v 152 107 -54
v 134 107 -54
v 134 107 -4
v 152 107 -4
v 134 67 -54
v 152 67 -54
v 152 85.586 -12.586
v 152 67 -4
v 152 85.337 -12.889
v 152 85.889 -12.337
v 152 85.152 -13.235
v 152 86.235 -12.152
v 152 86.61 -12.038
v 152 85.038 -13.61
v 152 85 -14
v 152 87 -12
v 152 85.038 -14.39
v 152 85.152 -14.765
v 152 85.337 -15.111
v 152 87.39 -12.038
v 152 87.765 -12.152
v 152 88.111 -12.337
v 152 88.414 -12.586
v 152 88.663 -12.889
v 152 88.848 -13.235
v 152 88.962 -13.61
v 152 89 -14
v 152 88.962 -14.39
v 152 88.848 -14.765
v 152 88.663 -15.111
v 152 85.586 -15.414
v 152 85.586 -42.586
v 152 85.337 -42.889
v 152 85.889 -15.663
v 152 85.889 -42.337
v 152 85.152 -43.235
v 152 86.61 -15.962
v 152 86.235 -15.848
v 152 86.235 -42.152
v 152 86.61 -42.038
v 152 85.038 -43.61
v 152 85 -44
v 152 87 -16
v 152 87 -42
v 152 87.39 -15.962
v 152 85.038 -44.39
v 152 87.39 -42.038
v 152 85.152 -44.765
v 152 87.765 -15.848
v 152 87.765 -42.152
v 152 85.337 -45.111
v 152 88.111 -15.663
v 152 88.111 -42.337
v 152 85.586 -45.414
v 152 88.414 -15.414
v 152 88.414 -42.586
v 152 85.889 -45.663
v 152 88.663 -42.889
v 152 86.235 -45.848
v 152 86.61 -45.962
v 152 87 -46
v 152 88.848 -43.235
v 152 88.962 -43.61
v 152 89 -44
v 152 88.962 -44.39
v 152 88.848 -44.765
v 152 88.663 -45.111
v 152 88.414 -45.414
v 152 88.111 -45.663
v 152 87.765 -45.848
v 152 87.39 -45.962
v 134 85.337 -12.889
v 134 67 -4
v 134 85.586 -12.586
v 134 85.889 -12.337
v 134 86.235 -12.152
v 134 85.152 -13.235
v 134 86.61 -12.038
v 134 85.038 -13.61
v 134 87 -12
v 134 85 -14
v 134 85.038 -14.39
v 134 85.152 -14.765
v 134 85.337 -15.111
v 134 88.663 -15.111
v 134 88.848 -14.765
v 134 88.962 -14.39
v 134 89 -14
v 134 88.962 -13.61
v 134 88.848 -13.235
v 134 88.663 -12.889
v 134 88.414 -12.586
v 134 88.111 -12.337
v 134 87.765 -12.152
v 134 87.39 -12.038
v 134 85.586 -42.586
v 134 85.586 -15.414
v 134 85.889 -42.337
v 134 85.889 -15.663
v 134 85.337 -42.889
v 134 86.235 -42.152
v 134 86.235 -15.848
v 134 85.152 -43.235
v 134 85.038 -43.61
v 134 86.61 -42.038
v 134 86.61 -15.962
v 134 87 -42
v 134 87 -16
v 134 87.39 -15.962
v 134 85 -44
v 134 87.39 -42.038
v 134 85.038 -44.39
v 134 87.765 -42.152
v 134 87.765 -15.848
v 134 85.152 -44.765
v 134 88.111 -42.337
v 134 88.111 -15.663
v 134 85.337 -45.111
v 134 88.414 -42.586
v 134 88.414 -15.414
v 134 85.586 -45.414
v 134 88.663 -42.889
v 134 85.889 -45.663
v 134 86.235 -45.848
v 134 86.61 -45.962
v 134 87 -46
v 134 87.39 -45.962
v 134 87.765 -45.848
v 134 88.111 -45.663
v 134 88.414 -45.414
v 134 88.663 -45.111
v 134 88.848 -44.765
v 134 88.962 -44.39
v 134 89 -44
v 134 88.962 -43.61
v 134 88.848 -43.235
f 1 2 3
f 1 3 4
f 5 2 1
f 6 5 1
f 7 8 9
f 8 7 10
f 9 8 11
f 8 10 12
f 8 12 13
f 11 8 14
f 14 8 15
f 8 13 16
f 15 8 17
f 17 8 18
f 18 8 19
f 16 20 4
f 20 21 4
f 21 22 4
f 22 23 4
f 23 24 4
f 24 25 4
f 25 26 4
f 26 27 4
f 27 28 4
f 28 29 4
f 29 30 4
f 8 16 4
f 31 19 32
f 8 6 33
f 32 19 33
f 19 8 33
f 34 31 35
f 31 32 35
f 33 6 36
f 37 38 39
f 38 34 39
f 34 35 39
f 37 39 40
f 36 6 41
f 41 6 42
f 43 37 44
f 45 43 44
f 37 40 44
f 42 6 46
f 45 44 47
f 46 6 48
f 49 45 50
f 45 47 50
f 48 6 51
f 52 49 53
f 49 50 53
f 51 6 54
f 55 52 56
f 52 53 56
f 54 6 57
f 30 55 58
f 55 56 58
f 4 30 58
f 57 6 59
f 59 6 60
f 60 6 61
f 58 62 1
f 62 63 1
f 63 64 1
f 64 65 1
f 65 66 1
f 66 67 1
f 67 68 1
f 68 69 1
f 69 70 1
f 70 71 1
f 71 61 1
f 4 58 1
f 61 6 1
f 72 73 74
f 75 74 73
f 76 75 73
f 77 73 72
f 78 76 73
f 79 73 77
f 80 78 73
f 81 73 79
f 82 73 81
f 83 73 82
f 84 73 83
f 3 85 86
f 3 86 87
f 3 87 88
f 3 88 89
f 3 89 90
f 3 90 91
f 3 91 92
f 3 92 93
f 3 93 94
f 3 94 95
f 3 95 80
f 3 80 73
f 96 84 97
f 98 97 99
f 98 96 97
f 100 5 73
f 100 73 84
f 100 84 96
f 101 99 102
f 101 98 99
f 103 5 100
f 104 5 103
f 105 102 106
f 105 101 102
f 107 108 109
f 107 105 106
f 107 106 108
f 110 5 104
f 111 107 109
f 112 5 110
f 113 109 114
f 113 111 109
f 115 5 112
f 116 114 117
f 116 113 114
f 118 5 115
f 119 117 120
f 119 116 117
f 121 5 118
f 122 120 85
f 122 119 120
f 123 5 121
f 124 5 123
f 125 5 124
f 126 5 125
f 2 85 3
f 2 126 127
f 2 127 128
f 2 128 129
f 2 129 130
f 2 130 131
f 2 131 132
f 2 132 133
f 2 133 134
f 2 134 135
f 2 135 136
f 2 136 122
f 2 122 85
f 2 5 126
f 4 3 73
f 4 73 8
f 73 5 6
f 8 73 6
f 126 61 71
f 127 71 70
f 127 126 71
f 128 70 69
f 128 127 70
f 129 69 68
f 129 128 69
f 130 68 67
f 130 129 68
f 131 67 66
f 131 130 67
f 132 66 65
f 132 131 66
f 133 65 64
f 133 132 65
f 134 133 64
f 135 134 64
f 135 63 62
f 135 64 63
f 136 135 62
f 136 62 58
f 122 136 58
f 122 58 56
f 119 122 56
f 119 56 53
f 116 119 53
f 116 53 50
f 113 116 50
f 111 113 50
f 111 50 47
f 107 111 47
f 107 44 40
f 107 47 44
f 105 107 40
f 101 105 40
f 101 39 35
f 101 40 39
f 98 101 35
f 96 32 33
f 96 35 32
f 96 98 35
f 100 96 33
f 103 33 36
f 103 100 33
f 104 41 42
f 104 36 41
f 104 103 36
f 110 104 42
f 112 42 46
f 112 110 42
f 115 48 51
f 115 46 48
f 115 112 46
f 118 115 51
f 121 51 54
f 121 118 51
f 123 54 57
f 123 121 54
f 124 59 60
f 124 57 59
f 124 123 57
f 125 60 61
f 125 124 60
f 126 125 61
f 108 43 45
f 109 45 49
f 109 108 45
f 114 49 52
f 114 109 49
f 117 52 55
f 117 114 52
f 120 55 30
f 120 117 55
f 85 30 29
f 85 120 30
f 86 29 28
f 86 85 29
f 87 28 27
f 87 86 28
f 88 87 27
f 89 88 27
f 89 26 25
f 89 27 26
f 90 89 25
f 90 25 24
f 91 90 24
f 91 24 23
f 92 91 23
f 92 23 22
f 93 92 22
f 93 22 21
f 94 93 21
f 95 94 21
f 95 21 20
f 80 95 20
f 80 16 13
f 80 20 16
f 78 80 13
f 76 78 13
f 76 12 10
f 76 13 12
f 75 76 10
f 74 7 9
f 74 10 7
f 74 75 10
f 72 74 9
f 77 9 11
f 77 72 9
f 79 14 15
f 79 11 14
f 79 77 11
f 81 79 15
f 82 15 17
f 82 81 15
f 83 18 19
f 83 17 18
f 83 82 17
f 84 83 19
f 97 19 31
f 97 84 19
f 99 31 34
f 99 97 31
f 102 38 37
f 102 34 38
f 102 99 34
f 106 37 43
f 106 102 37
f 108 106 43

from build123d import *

# Parameters (mm, degrees)
CYLINDER028_R           = 2
CYLINDER028_DEPTH       = 20
CYLINDER028_PITCH_ANGLE = 90
ARRAY026_Z_COUNT        = 2
ARRAY026_Z_PITCH        = 30
BOX016_W                = 18
BOX016_H                = 40
BOX016_DEPTH            = 50


with BuildPart() as array026:
    # Cylinder028 → Cylinder028 (new body)
    with BuildSketch(Plane.XY):
        Circle(CYLINDER028_R)
    extrude(amount=CYLINDER028_DEPTH)


with BuildPart() as array026_1:
    # Cylinder028 pitch: moved
    add(array026.part.rotate(Axis((0, 0, 0), (0, 1, 0)), CYLINDER028_PITCH_ANGLE))


with BuildPart() as array026_2:
    # Cylinder028 placement: moved
    add(array026_1.part.moved(Location((134, 87, -14))))

    # Array026 Z: Array026 ×2


with BuildPart() as array026_3:
    add(array026_2.part)
    with Locations(*[(0, 0, -i * ARRAY026_Z_PITCH) for i in range(1, ARRAY026_Z_COUNT)]):
        add(array026_2.part)


with BuildPart() as case_2_con003:
    # Box016 → Box016 (new body)
    with BuildSketch(Plane(origin=(134, 67, -54), x_dir=(1, 0, 0), z_dir=(0, 0, 1))):
        with Locations((9, 20)):
            Rectangle(BOX016_W, BOX016_H)
    extrude(amount=BOX016_DEPTH)

    # Cut027: cut Array026
    add(array026_3.part, mode=Mode.SUBTRACT)


solid = case_2_con003.part
